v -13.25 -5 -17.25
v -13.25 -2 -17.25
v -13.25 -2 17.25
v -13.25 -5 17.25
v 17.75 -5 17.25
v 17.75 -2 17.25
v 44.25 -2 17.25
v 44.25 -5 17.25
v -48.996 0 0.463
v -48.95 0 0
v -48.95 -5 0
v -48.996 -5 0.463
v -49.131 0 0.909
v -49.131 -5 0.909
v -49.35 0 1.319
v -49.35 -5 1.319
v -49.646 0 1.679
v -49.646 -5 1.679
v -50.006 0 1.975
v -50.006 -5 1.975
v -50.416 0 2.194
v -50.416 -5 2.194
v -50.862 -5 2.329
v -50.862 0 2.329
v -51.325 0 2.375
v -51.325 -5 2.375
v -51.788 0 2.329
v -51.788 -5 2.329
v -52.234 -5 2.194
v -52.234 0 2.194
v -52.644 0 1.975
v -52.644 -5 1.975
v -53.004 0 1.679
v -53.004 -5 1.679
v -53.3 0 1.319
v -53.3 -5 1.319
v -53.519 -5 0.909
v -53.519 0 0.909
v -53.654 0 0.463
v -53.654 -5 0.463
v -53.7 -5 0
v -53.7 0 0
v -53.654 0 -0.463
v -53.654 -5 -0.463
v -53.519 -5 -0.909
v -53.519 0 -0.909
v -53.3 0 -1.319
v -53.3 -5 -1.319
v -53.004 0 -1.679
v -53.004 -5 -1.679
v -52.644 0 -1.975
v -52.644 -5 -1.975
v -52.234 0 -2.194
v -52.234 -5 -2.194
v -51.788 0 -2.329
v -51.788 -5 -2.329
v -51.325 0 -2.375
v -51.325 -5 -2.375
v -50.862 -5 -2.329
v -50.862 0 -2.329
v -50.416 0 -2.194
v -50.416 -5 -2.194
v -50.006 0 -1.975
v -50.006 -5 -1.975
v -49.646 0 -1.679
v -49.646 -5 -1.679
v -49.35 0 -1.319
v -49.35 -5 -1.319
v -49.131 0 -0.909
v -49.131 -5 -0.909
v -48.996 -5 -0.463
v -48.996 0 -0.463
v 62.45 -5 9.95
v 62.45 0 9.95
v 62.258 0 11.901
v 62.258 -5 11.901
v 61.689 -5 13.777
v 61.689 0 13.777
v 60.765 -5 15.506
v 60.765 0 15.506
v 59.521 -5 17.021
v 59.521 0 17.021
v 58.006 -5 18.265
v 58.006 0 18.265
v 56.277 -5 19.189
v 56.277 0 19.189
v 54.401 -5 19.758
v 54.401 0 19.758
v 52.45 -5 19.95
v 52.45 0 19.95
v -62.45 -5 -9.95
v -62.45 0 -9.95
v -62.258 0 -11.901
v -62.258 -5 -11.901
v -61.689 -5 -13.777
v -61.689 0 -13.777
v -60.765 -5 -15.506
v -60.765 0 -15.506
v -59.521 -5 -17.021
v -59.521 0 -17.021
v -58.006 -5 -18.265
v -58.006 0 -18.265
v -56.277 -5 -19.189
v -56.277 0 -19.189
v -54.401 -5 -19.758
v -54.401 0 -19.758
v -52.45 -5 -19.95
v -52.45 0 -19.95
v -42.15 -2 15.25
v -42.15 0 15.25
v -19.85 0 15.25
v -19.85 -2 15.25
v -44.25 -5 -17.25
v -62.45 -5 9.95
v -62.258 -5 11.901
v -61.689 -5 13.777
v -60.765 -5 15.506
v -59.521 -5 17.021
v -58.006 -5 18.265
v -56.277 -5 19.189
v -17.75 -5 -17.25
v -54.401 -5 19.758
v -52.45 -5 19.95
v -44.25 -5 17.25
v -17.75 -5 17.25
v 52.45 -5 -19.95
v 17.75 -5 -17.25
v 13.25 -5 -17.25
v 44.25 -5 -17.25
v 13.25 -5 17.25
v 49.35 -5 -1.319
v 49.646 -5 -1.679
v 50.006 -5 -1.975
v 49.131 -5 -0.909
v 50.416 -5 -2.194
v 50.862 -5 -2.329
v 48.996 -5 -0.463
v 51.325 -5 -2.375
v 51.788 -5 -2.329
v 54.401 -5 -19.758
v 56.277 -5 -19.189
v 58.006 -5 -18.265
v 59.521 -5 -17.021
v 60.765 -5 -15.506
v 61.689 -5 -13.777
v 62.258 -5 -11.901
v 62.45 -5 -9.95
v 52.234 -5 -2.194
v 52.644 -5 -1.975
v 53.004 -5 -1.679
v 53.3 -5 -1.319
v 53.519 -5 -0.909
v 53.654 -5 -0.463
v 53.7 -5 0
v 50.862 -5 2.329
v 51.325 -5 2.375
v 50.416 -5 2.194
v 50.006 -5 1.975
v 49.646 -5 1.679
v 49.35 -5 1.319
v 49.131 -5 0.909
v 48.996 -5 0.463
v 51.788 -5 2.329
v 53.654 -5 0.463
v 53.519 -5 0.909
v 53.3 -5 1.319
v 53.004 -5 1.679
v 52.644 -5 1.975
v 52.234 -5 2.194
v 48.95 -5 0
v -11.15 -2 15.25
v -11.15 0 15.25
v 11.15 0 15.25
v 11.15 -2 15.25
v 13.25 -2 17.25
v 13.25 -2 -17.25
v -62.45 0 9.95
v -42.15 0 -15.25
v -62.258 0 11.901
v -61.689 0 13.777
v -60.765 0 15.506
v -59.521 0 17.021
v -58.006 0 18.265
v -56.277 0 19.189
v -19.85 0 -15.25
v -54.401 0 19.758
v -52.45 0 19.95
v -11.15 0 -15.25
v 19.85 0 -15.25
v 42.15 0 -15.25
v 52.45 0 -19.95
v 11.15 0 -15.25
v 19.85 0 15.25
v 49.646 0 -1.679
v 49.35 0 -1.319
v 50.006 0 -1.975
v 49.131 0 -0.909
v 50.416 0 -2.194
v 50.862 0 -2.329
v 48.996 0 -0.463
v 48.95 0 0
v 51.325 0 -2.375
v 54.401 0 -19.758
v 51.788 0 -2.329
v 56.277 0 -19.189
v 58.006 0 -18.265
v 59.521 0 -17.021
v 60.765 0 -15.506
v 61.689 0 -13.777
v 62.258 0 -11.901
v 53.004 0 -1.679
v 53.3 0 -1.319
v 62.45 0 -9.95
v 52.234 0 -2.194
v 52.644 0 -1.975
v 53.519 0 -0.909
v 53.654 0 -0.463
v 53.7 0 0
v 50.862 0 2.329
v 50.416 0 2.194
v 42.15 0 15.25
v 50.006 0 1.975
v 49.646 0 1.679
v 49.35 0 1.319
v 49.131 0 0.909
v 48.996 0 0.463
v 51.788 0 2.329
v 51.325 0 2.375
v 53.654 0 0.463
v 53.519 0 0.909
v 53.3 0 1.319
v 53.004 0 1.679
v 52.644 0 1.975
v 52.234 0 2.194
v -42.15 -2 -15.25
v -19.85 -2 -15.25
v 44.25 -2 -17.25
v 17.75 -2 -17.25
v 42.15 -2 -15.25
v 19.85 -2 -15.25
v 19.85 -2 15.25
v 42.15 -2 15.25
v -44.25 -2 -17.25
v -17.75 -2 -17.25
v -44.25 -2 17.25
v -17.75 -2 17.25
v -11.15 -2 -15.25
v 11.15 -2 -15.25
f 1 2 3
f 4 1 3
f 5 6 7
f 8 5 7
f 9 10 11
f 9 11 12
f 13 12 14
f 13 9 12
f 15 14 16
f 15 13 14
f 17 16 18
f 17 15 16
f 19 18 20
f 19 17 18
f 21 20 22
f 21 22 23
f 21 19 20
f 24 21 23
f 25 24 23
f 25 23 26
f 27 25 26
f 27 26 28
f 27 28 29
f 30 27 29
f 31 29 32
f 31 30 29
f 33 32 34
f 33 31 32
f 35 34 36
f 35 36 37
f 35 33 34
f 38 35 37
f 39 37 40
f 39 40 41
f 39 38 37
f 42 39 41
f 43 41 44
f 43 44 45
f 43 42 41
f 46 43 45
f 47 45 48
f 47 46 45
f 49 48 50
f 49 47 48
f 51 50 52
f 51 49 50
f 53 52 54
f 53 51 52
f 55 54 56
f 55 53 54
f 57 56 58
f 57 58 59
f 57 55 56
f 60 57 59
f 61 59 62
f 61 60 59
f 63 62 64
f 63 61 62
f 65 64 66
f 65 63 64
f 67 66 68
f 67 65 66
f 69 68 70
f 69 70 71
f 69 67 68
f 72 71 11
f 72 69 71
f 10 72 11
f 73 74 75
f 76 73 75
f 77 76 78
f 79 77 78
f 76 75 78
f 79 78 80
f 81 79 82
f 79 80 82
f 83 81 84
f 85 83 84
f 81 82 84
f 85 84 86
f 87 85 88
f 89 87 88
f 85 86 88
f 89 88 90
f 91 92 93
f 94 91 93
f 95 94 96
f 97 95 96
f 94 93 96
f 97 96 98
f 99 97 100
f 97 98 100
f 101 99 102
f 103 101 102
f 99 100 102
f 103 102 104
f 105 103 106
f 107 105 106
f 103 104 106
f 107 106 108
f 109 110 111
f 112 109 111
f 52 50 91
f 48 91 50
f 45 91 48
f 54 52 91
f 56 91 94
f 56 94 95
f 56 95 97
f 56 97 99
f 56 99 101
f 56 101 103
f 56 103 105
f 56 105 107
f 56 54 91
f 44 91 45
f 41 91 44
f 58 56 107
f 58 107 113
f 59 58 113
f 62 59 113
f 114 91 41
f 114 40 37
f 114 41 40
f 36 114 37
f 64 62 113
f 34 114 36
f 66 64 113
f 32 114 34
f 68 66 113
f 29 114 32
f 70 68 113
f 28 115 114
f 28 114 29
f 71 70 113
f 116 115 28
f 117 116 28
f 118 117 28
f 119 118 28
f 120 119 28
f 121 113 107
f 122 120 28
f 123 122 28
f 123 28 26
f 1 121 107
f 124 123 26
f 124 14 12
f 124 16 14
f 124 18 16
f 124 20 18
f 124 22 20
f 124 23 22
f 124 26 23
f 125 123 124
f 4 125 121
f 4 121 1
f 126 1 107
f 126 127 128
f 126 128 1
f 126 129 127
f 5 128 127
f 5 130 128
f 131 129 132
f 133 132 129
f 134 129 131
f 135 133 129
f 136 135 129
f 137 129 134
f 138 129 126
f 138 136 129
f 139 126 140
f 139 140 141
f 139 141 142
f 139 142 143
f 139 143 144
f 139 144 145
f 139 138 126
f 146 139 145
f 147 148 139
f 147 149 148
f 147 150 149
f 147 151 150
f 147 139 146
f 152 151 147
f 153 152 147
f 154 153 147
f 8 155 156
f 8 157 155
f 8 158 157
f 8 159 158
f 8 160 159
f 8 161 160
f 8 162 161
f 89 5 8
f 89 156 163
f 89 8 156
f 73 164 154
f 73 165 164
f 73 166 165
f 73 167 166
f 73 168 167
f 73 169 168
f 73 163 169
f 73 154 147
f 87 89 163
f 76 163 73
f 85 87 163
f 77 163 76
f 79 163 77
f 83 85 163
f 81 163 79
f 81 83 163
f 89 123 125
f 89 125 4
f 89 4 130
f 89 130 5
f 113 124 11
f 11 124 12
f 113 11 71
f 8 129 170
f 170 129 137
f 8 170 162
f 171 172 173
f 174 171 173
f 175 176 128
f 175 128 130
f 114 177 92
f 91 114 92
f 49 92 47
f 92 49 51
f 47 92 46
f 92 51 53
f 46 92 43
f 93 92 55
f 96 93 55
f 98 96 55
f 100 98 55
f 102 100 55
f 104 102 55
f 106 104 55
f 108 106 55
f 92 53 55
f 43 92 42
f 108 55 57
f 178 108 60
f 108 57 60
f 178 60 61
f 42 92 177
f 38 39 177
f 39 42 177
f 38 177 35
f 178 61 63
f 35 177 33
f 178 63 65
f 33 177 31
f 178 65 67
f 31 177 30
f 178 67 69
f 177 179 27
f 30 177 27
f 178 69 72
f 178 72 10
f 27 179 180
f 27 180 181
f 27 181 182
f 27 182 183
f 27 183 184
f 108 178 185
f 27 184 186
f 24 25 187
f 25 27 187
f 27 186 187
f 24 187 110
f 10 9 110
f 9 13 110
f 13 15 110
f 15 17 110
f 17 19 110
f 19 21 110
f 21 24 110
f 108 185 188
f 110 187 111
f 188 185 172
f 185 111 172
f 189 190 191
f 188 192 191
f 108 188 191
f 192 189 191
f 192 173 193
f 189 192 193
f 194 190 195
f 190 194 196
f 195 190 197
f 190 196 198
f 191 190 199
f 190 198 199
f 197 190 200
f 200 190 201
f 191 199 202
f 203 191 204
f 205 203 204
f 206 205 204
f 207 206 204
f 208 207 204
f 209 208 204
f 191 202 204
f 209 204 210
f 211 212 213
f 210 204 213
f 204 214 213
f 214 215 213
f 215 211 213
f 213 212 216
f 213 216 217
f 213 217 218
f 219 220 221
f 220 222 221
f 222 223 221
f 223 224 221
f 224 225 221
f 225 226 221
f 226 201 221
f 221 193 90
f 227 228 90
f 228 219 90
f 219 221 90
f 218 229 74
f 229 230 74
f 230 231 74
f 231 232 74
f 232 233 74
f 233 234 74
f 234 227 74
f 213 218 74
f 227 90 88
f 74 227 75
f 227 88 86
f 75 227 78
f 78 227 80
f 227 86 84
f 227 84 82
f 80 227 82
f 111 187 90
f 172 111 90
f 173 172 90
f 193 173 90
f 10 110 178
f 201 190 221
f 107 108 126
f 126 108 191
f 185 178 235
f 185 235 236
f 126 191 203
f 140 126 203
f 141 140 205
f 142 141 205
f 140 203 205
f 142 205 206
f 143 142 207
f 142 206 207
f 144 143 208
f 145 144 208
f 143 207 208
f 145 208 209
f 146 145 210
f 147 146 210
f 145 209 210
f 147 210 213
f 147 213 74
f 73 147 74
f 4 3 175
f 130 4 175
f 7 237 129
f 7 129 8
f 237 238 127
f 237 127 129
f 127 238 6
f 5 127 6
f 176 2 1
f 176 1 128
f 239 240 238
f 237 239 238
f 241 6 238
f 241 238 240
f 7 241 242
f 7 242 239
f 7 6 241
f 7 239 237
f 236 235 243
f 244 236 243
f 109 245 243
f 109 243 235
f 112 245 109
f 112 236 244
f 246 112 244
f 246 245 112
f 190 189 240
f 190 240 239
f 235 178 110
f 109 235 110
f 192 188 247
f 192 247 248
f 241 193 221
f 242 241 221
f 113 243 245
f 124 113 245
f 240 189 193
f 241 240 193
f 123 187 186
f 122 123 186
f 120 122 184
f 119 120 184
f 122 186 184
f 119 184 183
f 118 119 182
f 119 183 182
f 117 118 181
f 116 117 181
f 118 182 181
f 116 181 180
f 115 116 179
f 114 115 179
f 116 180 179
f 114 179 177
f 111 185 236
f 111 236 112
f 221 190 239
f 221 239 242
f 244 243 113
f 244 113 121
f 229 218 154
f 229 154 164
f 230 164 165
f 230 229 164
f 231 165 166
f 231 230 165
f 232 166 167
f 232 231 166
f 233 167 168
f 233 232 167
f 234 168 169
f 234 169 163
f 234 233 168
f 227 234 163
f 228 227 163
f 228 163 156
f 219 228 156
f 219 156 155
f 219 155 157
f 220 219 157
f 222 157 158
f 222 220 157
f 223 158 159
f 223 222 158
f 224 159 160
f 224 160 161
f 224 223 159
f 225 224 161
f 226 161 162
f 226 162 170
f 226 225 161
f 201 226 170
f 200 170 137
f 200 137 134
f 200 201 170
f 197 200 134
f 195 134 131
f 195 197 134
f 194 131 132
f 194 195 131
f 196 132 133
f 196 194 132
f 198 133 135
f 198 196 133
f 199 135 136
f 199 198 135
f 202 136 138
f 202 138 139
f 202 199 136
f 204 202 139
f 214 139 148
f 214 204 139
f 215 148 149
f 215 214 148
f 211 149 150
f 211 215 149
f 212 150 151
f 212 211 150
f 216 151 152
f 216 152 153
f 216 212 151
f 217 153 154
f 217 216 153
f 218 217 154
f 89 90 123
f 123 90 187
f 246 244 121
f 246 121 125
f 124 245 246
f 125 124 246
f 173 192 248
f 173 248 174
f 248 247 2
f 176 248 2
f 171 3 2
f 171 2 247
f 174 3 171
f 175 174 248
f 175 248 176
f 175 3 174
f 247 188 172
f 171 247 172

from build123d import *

# Parameters (mm, degrees)
F0_R     = 2.375
F0_W     = 26.5
F0_H     = 34.5
F1_DEPTH = 5
F0_W_2   = 22.3
F0_H_2   = 30.5
F2_DEPTH = 2


# Not quite as in the source:
# - a feature of the source that left no trace in its solid (it failed there, or was rolled back) is left out


with BuildPart() as f1:
    # F0 (on Front) → F1 (new body)
    with BuildSketch(Plane.XZ):
        with BuildLine():
            Line((52.45, 19.95), (-52.45, 19.95))
            ThreePointArc((-52.45, 19.95), (-59.5210678119, 17.0210678119), (-62.45, 9.95))
            Line((-62.45, 9.95), (-62.45, -9.95))
            ThreePointArc((-62.45, -9.95), (-59.5210678119, -17.0210678119), (-52.45, -19.95))
            Line((-52.45, -19.95), (52.45, -19.95))
            ThreePointArc((52.45, -19.95), (59.5210678119, -17.0210678119), (62.45, -9.95))
            Line((62.45, -9.95), (62.45, 9.95))
            ThreePointArc((62.45, 9.95), (59.5210678119, 17.0210678119), (52.45, 19.95))
        make_face()
        with Locations((-51.325, 0)):
            Circle(F0_R, mode=Mode.SUBTRACT)
        with Locations((-31, 0)):
            Rectangle(F0_W, F0_H, mode=Mode.SUBTRACT)
        Rectangle(F0_W, F0_H, mode=Mode.SUBTRACT)
        with Locations((31, 0)):
            Rectangle(F0_W, F0_H, mode=Mode.SUBTRACT)
        with Locations((51.325, 0)):
            Circle(F0_R, mode=Mode.SUBTRACT)
    extrude(amount=F1_DEPTH)

    # F0 (on Front) → F2 (join)
    with BuildSketch(Plane.XZ):
        with Locations((-31, 0)):
            Rectangle(F0_W, F0_H)
        with Locations((-31, 0)):
            Rectangle(F0_W_2, F0_H_2, mode=Mode.SUBTRACT)
        Rectangle(F0_W, F0_H)
        Rectangle(F0_W_2, F0_H_2, mode=Mode.SUBTRACT)
        with Locations((31, 0)):
            Rectangle(F0_W, F0_H)
        with Locations((31, 0)):
            Rectangle(F0_W_2, F0_H_2, mode=Mode.SUBTRACT)
    extrude(amount=F2_DEPTH)


solid = f1.part
